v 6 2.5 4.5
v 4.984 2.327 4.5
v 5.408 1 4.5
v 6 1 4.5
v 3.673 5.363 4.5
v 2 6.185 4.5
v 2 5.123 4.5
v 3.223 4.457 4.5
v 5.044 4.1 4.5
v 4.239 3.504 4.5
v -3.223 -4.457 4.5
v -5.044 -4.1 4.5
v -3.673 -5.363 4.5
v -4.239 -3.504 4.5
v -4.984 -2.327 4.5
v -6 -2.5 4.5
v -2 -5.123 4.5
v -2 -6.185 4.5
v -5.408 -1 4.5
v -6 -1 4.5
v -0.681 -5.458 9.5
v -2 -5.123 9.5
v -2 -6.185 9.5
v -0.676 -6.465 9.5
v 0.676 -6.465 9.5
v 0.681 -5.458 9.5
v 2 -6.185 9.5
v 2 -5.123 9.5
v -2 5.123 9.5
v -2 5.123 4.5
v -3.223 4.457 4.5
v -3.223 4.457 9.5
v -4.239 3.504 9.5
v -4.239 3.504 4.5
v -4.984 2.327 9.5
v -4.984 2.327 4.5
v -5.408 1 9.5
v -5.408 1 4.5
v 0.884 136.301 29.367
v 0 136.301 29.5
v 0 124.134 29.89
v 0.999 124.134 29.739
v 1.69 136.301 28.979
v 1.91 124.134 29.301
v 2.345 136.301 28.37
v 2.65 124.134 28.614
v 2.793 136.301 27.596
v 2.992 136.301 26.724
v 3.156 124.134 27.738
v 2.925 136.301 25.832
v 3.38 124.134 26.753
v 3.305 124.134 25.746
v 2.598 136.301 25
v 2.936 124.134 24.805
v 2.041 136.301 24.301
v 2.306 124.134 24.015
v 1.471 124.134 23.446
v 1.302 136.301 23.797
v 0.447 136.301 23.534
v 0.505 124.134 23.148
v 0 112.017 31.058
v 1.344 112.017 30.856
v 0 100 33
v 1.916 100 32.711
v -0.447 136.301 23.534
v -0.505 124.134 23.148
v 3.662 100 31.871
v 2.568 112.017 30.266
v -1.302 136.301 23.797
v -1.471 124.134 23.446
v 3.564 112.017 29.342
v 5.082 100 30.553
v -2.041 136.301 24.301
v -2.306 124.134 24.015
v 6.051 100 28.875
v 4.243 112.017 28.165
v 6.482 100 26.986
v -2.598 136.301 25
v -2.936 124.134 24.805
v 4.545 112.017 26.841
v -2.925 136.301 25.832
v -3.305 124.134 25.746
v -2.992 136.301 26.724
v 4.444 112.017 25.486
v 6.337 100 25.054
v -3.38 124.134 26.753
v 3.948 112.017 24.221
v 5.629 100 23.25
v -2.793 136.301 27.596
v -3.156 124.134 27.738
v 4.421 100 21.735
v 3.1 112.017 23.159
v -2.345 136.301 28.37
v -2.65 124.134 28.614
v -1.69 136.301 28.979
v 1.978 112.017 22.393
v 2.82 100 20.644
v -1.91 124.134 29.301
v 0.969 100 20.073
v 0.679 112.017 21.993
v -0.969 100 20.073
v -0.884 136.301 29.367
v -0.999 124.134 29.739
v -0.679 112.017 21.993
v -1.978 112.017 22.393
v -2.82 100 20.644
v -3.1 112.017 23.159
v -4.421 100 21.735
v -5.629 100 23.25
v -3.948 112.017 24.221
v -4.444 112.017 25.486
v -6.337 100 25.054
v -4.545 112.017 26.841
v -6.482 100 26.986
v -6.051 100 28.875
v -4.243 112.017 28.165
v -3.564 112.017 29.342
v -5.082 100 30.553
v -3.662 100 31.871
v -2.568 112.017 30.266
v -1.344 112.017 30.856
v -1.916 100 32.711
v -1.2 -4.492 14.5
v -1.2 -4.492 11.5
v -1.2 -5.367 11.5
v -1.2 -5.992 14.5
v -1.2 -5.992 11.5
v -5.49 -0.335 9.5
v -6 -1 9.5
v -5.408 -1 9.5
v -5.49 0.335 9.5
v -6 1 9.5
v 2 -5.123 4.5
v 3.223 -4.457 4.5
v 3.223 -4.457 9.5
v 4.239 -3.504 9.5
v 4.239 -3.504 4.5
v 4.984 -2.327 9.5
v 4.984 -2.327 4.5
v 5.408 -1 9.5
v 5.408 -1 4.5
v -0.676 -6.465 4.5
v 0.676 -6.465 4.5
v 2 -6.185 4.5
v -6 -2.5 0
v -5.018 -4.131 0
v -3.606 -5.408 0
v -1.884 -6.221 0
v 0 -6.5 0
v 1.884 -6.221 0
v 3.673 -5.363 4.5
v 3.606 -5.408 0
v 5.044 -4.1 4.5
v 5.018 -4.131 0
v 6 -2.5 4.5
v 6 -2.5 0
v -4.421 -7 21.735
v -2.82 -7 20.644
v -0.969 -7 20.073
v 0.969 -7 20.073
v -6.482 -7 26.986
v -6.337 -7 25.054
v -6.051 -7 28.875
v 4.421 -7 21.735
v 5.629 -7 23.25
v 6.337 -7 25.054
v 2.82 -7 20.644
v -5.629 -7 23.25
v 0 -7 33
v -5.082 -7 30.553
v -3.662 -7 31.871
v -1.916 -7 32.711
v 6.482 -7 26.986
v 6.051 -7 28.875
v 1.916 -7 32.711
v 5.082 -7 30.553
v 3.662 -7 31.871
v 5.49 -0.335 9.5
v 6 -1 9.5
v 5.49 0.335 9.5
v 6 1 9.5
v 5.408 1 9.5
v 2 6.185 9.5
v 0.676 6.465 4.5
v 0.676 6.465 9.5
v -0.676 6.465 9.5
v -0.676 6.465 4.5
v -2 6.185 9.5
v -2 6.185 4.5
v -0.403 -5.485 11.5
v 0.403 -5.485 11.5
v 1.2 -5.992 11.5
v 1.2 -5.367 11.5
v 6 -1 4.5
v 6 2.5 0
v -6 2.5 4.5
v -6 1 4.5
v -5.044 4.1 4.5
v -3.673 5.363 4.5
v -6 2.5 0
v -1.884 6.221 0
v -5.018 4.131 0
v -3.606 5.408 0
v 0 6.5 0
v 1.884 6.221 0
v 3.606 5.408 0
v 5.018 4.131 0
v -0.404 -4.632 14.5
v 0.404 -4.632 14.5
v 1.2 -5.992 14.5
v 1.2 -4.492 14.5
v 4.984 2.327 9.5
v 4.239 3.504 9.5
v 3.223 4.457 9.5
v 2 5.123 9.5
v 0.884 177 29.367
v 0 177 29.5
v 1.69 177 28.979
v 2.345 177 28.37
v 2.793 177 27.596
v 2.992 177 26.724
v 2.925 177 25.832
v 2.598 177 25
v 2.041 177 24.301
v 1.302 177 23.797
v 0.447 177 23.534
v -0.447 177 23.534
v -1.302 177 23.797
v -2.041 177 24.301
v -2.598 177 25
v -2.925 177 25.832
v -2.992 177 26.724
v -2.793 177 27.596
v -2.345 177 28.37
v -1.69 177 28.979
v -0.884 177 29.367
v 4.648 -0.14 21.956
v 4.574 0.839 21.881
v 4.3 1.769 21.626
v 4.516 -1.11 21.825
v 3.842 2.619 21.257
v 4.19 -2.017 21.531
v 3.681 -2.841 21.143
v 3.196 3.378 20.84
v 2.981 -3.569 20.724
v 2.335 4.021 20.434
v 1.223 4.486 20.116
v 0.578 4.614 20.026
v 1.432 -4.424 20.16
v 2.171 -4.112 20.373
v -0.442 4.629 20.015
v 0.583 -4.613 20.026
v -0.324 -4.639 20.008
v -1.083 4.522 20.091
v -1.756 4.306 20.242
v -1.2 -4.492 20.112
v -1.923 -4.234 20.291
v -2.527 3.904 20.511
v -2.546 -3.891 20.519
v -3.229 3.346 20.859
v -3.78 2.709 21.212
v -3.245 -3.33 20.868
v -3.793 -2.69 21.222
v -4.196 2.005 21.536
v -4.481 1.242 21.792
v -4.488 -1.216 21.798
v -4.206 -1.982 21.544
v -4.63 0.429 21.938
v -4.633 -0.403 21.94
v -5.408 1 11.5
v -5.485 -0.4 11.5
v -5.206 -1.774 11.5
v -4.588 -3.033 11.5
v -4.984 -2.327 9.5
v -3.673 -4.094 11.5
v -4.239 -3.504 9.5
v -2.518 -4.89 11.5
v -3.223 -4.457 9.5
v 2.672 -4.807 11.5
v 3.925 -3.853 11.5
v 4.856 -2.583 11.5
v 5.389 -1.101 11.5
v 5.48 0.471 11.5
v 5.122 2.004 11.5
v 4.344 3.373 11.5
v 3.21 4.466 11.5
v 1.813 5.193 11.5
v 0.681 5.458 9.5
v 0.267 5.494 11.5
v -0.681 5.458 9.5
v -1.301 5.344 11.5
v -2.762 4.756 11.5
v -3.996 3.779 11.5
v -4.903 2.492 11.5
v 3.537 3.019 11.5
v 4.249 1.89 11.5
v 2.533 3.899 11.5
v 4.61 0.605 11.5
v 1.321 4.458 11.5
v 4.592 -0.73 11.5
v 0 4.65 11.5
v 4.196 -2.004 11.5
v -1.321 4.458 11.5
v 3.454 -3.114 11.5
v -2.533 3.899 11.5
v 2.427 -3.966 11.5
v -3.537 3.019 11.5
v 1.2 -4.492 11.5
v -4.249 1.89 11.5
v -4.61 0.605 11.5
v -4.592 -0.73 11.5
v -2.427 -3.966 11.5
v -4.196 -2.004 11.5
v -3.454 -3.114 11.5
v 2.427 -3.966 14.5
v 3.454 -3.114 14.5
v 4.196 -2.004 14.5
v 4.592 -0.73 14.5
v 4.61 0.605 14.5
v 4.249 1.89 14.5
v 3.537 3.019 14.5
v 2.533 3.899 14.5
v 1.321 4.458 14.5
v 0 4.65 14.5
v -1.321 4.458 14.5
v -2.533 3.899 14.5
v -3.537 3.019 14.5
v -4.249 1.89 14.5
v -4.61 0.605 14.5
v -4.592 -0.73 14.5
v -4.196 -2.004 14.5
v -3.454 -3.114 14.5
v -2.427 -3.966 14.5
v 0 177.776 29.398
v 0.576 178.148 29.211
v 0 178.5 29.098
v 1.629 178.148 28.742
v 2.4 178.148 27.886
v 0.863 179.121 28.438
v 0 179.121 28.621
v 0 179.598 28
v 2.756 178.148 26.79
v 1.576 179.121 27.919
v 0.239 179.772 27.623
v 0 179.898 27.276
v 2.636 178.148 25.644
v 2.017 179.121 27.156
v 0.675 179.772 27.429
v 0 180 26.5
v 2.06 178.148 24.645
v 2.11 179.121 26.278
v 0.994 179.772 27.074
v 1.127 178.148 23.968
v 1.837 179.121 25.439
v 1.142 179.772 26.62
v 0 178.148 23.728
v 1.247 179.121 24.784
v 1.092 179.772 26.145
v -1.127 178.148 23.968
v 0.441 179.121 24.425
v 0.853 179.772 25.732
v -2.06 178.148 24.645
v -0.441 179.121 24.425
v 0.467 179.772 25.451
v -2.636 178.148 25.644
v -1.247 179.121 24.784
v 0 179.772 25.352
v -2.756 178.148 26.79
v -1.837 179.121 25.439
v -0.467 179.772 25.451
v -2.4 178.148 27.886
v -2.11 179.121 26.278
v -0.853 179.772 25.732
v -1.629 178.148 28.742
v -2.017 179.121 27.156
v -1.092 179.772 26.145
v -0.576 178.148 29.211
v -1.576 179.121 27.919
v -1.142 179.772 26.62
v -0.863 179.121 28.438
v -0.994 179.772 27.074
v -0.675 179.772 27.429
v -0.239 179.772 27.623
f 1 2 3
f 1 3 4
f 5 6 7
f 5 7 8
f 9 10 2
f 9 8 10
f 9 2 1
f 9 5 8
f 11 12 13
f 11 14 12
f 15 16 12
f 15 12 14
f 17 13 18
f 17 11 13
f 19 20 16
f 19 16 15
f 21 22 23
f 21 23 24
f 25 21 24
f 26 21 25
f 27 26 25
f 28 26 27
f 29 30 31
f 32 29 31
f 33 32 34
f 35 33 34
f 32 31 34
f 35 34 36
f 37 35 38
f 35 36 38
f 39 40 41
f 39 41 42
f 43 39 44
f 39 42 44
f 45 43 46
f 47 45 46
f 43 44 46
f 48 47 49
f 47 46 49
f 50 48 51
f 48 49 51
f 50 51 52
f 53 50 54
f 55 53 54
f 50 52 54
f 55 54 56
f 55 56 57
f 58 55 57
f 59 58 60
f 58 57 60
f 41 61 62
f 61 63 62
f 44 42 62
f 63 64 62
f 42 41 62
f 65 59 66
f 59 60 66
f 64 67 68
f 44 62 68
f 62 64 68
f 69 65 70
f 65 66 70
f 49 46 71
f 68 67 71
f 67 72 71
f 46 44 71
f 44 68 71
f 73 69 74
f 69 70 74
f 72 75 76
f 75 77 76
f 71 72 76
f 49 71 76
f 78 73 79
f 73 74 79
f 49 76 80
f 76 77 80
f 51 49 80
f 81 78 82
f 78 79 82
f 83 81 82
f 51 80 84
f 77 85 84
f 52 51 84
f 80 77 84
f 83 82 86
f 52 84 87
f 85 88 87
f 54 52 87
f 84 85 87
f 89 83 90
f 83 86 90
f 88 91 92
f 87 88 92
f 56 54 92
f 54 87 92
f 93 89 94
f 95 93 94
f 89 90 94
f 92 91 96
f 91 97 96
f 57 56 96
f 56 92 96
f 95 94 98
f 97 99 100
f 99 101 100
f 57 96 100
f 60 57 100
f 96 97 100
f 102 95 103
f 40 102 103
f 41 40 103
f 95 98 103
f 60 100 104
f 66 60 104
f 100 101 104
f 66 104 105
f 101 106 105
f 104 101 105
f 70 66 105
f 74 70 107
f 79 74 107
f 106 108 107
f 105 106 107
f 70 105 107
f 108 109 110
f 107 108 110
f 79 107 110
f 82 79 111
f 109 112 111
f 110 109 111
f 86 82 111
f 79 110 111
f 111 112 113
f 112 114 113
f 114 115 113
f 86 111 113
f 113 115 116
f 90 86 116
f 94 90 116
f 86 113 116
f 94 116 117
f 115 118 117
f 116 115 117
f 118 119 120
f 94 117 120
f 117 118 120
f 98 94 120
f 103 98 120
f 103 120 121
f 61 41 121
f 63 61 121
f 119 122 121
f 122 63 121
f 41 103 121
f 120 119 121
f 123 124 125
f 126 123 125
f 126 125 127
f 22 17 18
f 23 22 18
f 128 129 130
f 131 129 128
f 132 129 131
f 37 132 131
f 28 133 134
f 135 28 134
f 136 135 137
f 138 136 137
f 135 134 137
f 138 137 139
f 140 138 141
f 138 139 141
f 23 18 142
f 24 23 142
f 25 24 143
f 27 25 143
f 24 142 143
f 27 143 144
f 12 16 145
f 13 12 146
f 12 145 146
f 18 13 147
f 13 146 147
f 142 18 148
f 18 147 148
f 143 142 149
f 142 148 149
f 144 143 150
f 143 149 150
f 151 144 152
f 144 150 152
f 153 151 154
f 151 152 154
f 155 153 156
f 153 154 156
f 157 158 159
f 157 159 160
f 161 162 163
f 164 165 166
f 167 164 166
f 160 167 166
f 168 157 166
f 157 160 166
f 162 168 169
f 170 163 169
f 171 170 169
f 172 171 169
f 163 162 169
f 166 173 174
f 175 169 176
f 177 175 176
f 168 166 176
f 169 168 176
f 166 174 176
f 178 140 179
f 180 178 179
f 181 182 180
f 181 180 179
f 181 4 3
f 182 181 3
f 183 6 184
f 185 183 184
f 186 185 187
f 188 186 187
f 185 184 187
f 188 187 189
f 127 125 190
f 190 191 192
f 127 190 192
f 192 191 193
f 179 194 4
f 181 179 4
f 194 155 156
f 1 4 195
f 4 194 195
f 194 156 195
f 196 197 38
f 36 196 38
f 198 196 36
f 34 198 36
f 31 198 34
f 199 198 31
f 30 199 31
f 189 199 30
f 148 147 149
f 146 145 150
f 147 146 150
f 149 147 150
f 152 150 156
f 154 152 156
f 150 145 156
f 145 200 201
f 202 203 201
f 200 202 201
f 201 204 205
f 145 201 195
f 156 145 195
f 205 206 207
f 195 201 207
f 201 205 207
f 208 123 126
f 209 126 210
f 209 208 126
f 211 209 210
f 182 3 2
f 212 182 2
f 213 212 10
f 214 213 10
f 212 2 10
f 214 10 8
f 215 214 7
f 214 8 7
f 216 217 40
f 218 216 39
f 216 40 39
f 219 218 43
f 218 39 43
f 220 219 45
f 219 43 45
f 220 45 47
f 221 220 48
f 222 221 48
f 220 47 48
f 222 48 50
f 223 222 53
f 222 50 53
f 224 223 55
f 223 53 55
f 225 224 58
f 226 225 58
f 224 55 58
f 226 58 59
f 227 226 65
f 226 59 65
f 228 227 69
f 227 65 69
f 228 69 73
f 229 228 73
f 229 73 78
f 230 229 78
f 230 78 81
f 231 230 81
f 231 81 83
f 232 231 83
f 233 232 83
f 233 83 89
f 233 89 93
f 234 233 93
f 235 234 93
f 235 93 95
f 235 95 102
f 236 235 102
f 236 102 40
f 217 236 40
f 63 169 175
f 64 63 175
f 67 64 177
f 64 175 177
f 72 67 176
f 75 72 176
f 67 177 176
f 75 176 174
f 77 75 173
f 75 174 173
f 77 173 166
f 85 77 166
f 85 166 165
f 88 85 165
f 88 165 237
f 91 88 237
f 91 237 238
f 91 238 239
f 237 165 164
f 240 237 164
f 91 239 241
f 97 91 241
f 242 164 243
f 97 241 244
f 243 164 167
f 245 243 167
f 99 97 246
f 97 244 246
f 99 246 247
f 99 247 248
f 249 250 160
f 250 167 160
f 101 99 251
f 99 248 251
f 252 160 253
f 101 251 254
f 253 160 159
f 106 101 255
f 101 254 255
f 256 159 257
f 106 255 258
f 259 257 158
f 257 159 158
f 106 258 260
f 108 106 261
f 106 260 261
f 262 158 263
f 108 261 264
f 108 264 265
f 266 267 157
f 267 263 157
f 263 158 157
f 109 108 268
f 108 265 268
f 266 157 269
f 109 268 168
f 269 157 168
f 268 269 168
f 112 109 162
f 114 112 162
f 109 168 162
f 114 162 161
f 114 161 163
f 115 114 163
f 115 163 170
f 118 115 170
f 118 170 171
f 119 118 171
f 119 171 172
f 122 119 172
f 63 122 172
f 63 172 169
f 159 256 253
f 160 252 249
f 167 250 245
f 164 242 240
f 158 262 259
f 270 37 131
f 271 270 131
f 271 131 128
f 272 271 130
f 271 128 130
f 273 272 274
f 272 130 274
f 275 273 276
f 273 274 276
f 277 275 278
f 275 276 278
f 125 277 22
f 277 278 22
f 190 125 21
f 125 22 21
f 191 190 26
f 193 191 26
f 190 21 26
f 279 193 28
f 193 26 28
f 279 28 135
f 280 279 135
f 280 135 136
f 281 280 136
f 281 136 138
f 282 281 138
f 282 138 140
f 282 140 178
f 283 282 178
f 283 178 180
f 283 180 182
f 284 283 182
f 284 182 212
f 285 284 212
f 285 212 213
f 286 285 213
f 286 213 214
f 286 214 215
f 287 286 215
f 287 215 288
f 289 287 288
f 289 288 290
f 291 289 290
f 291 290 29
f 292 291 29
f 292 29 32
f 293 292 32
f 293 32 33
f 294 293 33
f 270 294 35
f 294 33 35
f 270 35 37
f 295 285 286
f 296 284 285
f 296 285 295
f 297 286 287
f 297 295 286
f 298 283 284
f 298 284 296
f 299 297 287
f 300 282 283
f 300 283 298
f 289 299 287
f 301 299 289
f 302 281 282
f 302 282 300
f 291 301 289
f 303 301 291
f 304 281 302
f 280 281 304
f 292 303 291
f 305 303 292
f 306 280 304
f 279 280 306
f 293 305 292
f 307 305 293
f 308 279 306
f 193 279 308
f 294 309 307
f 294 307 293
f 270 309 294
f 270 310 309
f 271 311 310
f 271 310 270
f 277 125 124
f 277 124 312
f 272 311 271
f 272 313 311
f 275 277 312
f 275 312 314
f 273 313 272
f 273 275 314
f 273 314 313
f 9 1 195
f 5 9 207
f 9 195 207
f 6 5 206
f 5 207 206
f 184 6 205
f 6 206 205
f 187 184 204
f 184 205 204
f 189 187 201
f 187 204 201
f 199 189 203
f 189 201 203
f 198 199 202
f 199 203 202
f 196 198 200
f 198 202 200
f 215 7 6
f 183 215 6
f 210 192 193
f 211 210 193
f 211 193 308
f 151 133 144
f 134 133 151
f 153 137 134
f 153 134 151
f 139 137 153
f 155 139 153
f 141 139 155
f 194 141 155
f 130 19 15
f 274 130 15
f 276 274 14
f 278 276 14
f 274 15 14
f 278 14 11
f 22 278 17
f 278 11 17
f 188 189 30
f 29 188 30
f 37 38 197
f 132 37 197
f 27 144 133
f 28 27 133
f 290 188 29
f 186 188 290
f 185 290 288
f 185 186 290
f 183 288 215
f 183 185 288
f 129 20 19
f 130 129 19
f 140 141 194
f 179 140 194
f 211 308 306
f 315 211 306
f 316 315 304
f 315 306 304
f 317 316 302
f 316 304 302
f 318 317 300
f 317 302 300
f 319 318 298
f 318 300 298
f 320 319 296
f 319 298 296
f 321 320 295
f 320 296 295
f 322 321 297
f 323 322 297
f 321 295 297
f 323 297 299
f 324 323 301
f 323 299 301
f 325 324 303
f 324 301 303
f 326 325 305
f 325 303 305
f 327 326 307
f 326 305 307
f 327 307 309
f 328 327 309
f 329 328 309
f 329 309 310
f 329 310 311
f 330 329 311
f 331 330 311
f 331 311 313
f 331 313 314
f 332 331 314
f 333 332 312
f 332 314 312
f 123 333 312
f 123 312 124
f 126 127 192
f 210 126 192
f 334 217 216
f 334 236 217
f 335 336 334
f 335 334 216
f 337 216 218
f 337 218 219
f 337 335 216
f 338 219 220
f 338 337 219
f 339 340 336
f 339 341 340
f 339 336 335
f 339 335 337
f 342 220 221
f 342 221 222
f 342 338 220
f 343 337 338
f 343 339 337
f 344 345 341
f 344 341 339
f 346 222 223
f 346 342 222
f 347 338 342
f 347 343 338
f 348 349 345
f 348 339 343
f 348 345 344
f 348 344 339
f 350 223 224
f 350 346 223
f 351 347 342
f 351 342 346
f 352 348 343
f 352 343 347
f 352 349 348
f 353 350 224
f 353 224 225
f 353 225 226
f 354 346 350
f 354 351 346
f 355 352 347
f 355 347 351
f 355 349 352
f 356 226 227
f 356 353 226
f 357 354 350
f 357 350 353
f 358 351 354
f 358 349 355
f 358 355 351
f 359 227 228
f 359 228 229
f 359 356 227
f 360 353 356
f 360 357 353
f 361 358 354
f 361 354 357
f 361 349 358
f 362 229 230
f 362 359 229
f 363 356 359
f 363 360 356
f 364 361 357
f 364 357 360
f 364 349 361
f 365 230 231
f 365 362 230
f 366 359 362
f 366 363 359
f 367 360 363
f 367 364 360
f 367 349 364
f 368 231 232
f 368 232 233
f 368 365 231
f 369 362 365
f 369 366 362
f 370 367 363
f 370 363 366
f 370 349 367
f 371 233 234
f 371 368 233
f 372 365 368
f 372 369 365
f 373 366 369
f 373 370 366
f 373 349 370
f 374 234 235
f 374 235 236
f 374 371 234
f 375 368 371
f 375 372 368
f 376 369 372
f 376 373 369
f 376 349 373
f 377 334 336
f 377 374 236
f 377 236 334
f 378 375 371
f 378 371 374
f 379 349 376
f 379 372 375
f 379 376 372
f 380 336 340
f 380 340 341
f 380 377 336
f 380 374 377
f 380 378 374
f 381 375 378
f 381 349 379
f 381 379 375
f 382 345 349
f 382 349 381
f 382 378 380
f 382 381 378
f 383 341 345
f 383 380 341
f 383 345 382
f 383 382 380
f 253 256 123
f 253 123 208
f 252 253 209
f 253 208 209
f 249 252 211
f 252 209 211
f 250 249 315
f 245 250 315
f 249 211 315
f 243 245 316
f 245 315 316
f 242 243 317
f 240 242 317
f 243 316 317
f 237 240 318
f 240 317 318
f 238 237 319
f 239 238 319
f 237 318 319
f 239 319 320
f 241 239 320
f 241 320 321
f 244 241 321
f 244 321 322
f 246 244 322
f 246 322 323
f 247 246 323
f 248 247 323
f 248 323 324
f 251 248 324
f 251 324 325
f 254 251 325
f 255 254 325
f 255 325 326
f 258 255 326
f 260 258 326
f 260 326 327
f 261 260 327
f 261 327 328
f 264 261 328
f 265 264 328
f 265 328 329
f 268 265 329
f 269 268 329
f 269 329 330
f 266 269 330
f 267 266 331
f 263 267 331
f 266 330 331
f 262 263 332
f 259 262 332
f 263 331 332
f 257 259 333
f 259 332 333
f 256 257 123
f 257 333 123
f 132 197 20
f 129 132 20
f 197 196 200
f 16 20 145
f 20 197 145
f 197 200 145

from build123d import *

# Parameters (mm, degrees)
BOSS_EXTRUDE1_DEPTH      = 4.5
BOSS_EXTRUDE2_DEPTH      = 5
SKETCH3_R                = 5.5
BOSS_EXTRUDE3_DEPTH      = 2
BOSS_EXTRUDE4_DEPTH      = 3
SKETCH5_R                = 4.65
BOSS_EXTRUDE5_DEPTH      = 12
BOSS_EXTRUDE6_DEPTH      = 100
BOSS_EXTRUDE6_DEPTH_BACK = 7
SKETCH6_R                = 6.5
SKETCH7_R                = 3
BOSS_EXTRUDE7_DEPTH      = 80
FILLET1_R                = 190
FILLET2_R                = 3


with BuildPart() as part:
    # Sketch1 → Boss-Extrude1 (new body)
    with BuildSketch(Plane.XY):
        with BuildLine():
            Line((-6, 2.5), (-6, -2.5))
            ThreePointArc((-6, -2.5), (0, -6.5), (6, -2.5))
            Line((6, -2.5), (6, 2.5))
            ThreePointArc((6, 2.5), (0, 6.5), (-6, 2.5))
        make_face()
    extrude(amount=BOSS_EXTRUDE1_DEPTH)

    # Sketch2 → Boss-Extrude2 (add)
    with BuildSketch(Plane.XY.offset(4.5)):
        with BuildLine():
            ThreePointArc((2, 6.184658438), (0, 6.5), (-2, 6.184658438))
            Line((-2, 6.184658438), (-2, 5.123475383))
            ThreePointArc((-2, 5.123475383), (-4.239291123, 3.504056332), (-5.408326913, 1))
            Line((-5.408326913, 1), (-6, 1))
            Line((-6, 1), (-6, -1))
            Line((-6, -1), (-5.408326913, -1))
            ThreePointArc((-5.408326913, -1), (-4.239291123, -3.504056332), (-2, -5.123475383))
            Line((-2, -5.123475383), (-2, -6.184658438))
            ThreePointArc((-2, -6.184658438), (0, -6.5), (2, -6.184658438))
            Line((2, -6.184658438), (2, -5.123475383))
            ThreePointArc((2, -5.123475383), (4.239291123, -3.504056332), (5.408326913, -1))
            Line((5.408326913, -1), (6, -1))
            Line((6, -1), (6, 1))
            Line((6, 1), (5.408326913, 1))
            ThreePointArc((5.408326913, 1), (4.239291123, 3.504056332), (2, 5.123475383))
            Line((2, 5.123475383), (2, 6.184658438))
        make_face()
    extrude(amount=BOSS_EXTRUDE2_DEPTH)

    # Sketch3 → Boss-Extrude3 (add)
    with BuildSketch(Plane.XY.offset(9.5)):
        with Locations(Location((0, 0, 0), (0, 0, 169.524318304))):
            Circle(SKETCH3_R)
    extrude(amount=BOSS_EXTRUDE3_DEPTH)

    # Sketch4 → Boss-Extrude4 (add)
    with BuildSketch(Plane.XY.offset(11.5)):
        with BuildLine():
            Line((-1.2, -4.49249374), (-1.2, -5.99249374))
            Line((-1.2, -5.99249374), (1.2, -5.99249374))
            Line((1.2, -5.99249374), (1.2, -4.49249374))
            ThreePointArc((1.2, -4.49249374), (0, 4.65), (-1.2, -4.49249374))
        make_face()
    extrude(amount=BOSS_EXTRUDE4_DEPTH)

    # Sketch5 → Boss-Extrude5 (add)
    with BuildSketch(Plane.XY.offset(14.5)):
        with Locations(Location((0, 0, 0), (0, 0, 255.044751683))):
            Circle(SKETCH5_R)
    extrude(amount=BOSS_EXTRUDE5_DEPTH)

    # Sketch6 → Boss-Extrude6 (add, two sides: drawn at the far end of the back side and taken through both)
    with BuildSketch(Plane(origin=(0, 0, 0), x_dir=(1, 0, 0), z_dir=(0, 1, 0)).offset(-BOSS_EXTRUDE6_DEPTH_BACK)):
        with Locations(Location((0, -26.5, 0), (0, 0, 270))):
            Circle(SKETCH6_R)
    extrude(amount=BOSS_EXTRUDE6_DEPTH + BOSS_EXTRUDE6_DEPTH_BACK)

    # Sketch7 → Boss-Extrude7 (add)
    with BuildSketch(Plane(origin=(0, 100, 0), x_dir=(1, 0, 0), z_dir=(0, 1, 0))):
        with Locations(Location((0, -26.5, 0), (0, 0, 270))):
            Circle(SKETCH7_R)
    extrude(amount=BOSS_EXTRUDE7_DEPTH)

    # Fillet1
    # the kernel refuses this fillet: 190 mm, written as the material it adds along each edge
    with BuildSketch(Plane(origin=(0, 100, 26.5), x_dir=(0, 0, 1), z_dir=(-1, 0, 0))) as fillet1_piece_1:
        with BuildLine():
            CenterArc((193, 36.300826437), FILLET1_R, 180, 11.014474836)
            Line((3, 36.300826437), (0, 36.300826437))
            Line((0, 36.300826437), (0, 0))
            Line((0, 0), (3, -3.8))
            ThreePointArc((3, -3.8), (4.75, -3.8), (2.77, -0.726016529))
            Line((2.77, -0.726016529), (6.5, 0))
        make_face()
    revolve(axis=Axis((0, 100, 26.5), (0, 1, 0)))

    # Fillet2
    fillet2_edges = [part.edges().sort_by_distance(p)[0] for p in [
        (0, 180, 23.5),
    ]]
    fillet(fillet2_edges, radius=FILLET2_R)


solid = part.part
